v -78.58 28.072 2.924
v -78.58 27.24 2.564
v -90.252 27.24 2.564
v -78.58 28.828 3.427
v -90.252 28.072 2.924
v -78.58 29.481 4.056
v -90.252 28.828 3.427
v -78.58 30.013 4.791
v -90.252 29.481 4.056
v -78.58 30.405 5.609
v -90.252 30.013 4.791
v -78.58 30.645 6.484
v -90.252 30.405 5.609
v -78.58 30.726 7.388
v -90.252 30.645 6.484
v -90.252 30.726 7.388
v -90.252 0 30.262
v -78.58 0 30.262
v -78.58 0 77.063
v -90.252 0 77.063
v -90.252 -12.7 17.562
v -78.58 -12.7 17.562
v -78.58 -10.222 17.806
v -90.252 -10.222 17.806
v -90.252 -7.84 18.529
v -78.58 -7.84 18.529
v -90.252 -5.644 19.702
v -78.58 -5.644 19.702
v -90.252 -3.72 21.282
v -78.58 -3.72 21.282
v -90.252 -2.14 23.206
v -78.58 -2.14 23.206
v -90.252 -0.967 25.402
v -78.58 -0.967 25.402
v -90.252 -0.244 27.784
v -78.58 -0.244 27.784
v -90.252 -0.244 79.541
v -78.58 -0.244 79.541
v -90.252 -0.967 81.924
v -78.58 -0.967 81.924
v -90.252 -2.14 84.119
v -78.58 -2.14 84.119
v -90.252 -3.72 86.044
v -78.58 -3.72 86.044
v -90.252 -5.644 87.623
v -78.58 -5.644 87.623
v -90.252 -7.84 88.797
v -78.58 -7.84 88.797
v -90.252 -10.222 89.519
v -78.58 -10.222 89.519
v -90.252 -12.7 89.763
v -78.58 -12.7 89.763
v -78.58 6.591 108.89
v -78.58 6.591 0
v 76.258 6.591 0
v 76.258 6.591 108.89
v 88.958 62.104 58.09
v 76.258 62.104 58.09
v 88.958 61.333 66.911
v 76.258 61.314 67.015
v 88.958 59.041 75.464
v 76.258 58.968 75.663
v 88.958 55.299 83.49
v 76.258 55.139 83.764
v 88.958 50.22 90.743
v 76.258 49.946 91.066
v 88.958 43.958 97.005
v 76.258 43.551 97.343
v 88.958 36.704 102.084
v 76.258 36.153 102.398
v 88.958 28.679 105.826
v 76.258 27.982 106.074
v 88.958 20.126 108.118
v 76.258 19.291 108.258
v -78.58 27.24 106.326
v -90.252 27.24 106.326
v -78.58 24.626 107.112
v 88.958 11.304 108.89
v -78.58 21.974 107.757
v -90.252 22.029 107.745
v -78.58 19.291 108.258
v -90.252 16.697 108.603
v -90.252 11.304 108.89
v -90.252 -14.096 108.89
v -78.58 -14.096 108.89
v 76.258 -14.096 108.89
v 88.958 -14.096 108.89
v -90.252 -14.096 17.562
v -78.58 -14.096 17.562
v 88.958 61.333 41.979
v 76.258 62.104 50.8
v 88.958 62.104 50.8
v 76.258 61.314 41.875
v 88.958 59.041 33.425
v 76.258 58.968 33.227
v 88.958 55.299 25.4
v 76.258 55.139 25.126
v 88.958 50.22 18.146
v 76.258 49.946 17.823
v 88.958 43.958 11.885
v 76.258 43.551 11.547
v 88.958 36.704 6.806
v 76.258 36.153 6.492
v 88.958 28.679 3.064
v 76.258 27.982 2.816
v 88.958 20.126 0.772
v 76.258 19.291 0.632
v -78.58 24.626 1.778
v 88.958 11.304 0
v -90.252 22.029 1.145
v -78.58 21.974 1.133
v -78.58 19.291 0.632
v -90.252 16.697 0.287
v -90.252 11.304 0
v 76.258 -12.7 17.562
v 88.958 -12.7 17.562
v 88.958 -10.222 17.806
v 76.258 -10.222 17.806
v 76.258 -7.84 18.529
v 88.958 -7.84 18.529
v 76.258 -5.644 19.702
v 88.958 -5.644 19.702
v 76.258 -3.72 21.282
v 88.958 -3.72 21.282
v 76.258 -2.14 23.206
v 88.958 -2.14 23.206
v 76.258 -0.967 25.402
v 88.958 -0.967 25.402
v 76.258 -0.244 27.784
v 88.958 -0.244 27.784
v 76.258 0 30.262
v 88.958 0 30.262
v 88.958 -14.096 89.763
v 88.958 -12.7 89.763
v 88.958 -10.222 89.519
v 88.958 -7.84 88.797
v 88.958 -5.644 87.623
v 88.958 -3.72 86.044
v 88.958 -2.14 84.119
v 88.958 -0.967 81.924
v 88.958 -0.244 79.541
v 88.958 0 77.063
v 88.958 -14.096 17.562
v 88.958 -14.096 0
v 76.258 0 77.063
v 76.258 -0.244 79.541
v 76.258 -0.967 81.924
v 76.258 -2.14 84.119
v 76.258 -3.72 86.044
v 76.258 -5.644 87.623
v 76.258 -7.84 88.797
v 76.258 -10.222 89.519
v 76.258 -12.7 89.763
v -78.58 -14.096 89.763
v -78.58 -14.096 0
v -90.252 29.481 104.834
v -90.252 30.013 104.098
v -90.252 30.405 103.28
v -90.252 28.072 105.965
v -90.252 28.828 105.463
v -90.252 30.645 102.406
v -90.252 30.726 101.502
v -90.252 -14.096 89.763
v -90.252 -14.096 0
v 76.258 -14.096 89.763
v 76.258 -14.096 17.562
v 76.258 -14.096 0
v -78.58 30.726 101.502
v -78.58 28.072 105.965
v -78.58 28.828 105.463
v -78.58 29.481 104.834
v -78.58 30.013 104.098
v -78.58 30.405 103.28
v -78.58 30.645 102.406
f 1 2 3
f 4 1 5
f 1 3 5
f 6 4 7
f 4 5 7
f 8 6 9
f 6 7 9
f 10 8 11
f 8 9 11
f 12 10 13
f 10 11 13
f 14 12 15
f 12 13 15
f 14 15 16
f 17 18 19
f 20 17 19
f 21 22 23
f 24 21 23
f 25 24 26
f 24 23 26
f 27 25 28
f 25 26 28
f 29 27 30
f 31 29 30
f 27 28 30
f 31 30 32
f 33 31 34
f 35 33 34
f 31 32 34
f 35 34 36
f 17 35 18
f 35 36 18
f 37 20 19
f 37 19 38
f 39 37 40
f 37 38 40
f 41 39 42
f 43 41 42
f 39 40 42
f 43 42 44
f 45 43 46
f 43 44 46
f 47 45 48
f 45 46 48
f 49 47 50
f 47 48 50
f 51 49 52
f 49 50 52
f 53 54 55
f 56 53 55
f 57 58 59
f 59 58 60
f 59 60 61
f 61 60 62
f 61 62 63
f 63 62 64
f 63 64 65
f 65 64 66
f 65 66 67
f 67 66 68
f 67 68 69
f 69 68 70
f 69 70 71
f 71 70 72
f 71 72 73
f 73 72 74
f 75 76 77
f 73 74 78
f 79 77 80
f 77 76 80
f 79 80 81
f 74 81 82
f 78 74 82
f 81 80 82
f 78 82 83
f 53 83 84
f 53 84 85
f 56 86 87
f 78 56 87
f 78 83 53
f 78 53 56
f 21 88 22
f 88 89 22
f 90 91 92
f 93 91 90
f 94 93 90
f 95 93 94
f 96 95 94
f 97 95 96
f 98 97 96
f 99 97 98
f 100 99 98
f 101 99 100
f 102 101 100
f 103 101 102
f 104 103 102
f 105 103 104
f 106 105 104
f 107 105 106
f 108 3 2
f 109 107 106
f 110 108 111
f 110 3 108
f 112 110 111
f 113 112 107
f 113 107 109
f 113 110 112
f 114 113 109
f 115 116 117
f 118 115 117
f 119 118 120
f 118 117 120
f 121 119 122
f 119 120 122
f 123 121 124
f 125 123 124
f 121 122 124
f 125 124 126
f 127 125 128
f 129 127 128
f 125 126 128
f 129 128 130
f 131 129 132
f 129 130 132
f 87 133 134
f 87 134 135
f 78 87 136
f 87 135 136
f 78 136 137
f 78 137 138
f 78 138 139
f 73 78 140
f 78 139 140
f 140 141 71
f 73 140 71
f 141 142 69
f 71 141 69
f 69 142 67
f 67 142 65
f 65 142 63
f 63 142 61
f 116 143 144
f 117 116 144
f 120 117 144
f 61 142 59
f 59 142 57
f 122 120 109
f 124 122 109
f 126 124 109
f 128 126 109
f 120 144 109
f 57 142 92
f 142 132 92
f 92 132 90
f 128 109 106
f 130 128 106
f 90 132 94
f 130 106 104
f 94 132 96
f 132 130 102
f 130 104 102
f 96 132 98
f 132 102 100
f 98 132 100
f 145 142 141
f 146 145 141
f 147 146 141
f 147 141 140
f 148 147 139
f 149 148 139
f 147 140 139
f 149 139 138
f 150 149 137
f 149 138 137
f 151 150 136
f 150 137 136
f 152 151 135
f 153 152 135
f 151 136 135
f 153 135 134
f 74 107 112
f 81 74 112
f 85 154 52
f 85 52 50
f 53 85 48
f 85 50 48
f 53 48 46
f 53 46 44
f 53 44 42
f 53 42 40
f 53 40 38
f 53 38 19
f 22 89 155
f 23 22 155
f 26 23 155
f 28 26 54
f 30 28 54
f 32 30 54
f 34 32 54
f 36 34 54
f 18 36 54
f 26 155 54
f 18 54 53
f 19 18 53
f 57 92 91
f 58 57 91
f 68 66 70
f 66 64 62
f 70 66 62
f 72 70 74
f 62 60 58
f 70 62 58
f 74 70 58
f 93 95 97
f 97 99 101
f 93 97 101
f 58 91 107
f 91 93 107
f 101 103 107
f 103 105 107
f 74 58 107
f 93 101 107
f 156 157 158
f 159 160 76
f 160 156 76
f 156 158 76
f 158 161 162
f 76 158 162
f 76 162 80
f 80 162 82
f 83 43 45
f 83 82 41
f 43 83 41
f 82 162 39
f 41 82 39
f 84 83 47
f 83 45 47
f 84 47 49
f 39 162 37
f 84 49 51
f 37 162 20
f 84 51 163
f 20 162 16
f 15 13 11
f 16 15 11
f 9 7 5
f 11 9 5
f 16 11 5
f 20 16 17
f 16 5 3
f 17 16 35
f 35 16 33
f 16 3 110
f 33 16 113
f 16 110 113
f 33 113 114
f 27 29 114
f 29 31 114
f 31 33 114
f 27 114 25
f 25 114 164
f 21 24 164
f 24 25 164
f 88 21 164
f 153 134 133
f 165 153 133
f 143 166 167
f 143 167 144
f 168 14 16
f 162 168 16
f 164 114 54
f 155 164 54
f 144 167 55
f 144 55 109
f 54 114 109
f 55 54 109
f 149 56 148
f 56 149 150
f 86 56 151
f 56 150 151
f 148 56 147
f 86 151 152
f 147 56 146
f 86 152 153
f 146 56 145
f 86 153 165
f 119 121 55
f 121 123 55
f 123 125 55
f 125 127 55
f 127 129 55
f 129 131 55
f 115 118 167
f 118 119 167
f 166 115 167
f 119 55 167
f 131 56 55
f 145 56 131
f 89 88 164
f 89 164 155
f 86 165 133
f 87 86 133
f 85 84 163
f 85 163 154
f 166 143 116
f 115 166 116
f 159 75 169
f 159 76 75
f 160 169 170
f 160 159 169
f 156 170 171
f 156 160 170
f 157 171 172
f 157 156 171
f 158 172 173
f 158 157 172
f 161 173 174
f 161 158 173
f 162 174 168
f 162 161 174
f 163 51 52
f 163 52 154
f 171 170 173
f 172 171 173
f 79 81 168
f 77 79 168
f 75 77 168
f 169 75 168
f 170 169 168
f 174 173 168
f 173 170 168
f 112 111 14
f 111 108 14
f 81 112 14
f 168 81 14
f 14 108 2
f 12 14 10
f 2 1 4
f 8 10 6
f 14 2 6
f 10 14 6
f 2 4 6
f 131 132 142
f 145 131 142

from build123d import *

# Parameters (mm, degrees)
F1_DEPTH = 108.8898
F2_R     = 50.8
F3_R     = 5.08
F5_DEPTH = 635


with BuildPart() as f1:
    # F0 (on Top) → F1 (new body)
    with BuildSketch(Plane.XY):
        Polygon((76.2579515576, 19.2914448351), (-78.5804484424, 19.2914448351), (-78.5804484424, 30.7262744755), (-90.2520939708, 30.7262744755), (-90.2520939708, -14.095553197), (-78.5804484424, -14.095553197), (-78.5804484424, 6.5914448351), (76.2579515576, 6.5914448351), (76.2579515576, -14.095553197), (88.9579515576, -14.095553197), (88.9579515576, 62.104446803), (76.2579515576, 62.104446803), align=None)
    extrude(amount=F1_DEPTH)

    # F2
    f2_edges = [f1.edges().sort_by_distance(p)[0] for p in [
        (82.607952, 62.104447, 108.8898),
        (82.607952, 62.104447, 0),
    ]]
    fillet(f2_edges, radius=F2_R)

    # F3
    f3_edges = [f1.edges().sort_by_distance(p)[0] for p in [
        (-84.416271, 30.726274, 105.030535),
        (-84.416271, 30.726274, 3.859265),
    ]]
    fillet(f3_edges, radius=F3_R)

    # F4 (on Right) → F5 (cut, symmetric)
    with BuildSketch(Plane.YZ):
        with BuildLine():
            ThreePointArc((0, 77.0634550929), (-3.7197438789, 86.043711214), (-12.7, 89.7634550929))
            Line((-12.7, 89.7634550929), (-24.0334216505, 89.7634550929))
            Line((-24.0334216505, 89.7634550929), (-24.0334216505, 17.5617840141))
            Line((-24.0334216505, 17.5617840141), (-12.7, 17.5617840141))
            ThreePointArc((-12.7, 17.5617840141), (-3.7197438789, 21.281527893), (0, 30.2617840141))
            Line((0, 30.2617840141), (0, 77.0634550929))
        make_face()
    extrude(amount=F5_DEPTH, both=True, mode=Mode.SUBTRACT)


solid = f1.part
